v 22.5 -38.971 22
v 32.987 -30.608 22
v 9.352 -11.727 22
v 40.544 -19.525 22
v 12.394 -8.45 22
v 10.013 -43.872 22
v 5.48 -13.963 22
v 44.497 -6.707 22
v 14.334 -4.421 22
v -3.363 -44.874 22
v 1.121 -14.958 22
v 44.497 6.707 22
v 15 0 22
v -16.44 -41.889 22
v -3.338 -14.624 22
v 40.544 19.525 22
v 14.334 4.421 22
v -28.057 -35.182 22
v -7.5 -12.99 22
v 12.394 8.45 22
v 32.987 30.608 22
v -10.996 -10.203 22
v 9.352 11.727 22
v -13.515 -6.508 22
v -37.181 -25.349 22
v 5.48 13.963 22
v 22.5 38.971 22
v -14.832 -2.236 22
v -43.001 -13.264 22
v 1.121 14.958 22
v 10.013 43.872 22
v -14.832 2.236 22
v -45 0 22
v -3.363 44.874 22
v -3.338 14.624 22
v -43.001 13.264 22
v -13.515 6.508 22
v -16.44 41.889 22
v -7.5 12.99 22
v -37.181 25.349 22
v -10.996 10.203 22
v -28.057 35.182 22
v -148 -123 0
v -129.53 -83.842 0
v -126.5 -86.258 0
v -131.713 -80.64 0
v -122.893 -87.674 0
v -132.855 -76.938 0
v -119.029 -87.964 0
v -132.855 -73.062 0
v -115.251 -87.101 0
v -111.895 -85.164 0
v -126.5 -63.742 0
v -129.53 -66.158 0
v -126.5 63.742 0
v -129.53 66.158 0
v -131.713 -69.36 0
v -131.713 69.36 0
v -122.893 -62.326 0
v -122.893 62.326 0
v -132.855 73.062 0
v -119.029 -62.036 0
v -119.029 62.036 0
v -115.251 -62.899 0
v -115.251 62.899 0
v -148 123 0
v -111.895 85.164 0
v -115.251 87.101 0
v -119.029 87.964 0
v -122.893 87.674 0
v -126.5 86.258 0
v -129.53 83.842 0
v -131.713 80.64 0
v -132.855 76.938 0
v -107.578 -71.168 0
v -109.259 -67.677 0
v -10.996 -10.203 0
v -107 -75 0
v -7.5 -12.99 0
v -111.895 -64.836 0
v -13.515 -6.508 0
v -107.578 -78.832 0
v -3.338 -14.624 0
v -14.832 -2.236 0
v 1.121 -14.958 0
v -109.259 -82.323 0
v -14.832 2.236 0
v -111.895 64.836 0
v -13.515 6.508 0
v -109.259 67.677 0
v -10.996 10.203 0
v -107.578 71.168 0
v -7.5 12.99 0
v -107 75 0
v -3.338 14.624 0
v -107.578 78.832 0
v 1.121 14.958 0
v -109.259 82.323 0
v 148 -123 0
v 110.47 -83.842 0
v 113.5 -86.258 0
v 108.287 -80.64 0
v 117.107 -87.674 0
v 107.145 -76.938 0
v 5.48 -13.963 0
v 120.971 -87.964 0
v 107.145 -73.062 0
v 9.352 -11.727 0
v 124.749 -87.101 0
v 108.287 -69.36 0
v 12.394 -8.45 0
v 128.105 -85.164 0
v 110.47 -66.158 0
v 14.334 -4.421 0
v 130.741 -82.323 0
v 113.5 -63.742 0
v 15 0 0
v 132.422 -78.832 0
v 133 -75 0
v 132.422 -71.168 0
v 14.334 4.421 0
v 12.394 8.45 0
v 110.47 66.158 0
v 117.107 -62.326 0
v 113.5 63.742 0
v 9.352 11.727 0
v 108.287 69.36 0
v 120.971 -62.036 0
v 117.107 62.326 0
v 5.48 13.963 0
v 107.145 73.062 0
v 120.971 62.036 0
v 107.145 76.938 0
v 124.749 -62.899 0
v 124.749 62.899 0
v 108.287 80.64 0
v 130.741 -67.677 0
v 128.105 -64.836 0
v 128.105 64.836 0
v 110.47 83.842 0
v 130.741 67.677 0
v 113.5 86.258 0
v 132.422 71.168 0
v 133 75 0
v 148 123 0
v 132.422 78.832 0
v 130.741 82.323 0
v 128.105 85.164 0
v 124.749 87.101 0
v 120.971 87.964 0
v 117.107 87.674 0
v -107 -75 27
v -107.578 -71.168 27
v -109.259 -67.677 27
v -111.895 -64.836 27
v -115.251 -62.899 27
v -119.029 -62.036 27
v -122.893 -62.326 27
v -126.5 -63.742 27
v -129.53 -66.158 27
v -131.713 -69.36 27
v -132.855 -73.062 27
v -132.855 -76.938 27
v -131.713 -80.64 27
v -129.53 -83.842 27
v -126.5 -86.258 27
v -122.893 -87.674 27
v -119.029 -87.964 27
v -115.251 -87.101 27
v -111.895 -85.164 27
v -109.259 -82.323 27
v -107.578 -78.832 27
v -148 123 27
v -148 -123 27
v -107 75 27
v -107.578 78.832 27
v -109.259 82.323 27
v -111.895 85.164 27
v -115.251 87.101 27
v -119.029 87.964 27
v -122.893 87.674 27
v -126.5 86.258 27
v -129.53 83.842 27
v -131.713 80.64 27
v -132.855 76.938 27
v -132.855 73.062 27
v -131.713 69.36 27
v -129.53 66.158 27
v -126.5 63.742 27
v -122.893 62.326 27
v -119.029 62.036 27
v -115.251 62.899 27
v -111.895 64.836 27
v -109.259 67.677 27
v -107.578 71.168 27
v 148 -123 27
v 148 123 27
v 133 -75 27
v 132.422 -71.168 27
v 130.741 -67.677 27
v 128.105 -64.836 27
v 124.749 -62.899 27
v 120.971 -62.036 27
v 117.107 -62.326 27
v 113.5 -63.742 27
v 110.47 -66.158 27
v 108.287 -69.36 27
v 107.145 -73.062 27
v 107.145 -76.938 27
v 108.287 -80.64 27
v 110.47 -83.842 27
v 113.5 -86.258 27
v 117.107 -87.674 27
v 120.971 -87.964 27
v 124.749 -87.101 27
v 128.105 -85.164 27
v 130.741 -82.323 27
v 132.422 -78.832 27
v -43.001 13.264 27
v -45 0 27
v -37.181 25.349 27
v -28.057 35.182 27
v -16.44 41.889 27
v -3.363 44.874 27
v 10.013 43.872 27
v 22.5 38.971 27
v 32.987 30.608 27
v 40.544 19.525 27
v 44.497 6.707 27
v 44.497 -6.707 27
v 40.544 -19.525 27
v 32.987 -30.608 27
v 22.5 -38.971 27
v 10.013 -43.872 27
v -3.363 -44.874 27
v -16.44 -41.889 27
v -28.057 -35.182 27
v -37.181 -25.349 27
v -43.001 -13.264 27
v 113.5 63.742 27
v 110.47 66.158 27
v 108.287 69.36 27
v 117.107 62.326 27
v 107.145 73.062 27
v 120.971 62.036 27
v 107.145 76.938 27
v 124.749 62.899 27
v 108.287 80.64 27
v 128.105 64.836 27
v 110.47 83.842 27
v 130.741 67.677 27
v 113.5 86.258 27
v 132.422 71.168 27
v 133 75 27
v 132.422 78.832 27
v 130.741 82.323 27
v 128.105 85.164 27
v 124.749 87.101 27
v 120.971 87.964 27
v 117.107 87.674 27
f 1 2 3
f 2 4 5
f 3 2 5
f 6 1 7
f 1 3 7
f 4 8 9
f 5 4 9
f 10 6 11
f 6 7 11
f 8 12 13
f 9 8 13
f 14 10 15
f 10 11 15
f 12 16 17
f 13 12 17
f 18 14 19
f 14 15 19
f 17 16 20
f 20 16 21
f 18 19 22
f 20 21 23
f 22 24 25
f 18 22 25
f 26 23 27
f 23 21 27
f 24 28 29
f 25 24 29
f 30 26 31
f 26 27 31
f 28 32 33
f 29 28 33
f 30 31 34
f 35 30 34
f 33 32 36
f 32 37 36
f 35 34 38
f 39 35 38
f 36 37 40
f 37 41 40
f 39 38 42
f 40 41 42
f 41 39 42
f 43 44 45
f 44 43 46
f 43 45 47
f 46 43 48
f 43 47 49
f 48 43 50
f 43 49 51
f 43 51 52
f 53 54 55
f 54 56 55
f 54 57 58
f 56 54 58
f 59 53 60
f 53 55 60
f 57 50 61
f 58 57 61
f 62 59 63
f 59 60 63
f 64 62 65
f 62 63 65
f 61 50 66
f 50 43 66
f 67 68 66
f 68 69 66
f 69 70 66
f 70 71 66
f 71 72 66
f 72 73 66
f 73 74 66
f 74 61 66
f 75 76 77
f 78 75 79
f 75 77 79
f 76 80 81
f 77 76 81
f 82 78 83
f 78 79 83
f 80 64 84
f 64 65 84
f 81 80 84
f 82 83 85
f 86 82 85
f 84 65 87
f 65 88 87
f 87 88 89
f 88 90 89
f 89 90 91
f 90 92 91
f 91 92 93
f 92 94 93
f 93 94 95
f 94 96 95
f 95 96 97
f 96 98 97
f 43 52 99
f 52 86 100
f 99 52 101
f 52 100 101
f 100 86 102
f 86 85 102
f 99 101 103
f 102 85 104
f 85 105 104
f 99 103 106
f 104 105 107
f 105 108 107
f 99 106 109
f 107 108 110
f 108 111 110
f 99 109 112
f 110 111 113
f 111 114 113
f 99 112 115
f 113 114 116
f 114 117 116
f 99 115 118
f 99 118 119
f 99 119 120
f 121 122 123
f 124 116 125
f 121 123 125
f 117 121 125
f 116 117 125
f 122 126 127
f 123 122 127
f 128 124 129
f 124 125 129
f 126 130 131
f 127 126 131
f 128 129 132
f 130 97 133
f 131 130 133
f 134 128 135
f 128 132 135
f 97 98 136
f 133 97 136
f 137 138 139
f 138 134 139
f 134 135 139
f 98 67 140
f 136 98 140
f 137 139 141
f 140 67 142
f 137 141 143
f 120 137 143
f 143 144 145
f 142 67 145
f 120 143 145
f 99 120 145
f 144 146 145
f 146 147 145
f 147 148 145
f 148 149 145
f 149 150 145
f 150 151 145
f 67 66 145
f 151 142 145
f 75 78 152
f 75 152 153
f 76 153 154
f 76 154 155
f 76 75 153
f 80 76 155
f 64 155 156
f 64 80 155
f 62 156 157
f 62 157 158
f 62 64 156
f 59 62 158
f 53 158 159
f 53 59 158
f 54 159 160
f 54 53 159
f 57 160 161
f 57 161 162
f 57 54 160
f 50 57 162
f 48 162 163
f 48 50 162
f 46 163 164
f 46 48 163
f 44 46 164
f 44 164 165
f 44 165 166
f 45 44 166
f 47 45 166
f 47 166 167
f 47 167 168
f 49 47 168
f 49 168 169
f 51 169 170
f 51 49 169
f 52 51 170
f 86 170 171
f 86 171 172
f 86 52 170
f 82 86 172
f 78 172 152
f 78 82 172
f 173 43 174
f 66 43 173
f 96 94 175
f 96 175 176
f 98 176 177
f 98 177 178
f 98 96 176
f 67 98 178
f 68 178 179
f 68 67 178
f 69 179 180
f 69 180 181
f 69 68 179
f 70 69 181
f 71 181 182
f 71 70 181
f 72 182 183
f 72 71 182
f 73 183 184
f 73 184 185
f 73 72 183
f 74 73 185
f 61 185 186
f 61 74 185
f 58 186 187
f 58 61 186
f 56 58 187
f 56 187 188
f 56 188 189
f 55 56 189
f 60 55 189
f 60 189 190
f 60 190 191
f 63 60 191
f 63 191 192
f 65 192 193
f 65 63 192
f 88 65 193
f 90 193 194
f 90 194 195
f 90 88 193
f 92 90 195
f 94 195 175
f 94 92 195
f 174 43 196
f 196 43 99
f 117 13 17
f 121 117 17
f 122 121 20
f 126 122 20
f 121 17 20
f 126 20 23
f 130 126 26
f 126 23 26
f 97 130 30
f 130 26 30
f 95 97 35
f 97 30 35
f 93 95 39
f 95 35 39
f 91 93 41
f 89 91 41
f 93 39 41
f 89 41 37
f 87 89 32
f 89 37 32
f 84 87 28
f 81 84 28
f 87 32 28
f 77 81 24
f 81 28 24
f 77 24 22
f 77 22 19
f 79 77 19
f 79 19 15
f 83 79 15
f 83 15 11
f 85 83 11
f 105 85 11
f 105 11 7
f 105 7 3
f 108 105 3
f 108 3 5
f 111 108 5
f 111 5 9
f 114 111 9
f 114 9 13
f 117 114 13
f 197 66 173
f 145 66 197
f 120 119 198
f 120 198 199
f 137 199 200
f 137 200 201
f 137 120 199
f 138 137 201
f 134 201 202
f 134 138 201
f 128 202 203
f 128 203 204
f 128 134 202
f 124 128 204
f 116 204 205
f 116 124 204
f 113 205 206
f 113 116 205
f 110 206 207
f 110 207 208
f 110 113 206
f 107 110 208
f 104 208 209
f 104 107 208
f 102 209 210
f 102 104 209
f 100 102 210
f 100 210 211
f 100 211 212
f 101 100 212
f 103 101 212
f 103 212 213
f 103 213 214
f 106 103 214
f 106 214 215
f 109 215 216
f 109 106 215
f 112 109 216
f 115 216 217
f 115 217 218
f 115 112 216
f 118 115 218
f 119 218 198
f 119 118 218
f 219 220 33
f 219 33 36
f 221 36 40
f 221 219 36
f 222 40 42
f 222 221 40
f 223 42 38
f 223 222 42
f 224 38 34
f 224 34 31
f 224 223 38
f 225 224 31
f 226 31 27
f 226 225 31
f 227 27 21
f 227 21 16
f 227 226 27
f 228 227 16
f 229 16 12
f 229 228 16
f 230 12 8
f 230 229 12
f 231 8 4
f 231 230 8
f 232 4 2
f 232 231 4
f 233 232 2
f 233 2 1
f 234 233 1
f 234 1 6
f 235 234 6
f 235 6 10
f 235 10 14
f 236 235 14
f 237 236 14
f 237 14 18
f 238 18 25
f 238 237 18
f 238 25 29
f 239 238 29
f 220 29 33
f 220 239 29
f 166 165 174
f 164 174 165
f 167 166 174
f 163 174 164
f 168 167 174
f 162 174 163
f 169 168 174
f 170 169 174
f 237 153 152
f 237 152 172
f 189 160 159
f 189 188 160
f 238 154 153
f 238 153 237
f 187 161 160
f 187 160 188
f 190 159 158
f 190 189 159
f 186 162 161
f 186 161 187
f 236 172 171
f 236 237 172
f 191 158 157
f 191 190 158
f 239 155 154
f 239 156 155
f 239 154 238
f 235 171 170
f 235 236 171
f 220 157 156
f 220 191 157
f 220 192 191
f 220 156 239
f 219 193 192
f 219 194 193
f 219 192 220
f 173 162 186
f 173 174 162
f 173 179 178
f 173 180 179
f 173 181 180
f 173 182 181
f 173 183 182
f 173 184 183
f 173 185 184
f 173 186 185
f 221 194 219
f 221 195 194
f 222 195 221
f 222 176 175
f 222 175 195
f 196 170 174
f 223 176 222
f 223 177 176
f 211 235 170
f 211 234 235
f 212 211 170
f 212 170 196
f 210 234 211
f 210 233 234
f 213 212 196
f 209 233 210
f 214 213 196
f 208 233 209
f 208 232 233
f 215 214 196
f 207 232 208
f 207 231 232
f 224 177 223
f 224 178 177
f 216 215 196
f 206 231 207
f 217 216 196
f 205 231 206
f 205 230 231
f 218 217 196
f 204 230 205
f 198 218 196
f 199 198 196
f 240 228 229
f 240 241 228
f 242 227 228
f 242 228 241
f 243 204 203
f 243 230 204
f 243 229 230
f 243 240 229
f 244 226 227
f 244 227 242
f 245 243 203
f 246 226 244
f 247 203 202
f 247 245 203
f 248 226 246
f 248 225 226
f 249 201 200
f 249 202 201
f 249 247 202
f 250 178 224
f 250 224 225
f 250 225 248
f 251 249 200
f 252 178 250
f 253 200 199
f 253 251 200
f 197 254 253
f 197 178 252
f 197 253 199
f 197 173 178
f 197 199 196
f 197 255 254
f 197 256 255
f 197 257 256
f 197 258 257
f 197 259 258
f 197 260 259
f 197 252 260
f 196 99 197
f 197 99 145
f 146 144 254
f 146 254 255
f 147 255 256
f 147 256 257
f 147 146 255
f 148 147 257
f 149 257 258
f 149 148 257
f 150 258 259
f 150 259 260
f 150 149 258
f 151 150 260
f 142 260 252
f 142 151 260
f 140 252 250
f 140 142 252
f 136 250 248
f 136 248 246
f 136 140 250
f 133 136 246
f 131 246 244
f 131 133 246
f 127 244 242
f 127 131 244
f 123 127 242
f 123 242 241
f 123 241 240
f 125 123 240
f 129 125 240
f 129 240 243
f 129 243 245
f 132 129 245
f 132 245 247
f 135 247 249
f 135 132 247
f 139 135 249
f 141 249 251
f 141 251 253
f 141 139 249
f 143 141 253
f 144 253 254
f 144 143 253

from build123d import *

# Parameters (mm, degrees)
SKETCH1_W      = 296
SKETCH1_H      = 246
SKETCH1_R      = 13
EXTRUDE1_DEPTH = 27
SKETCH2_R      = 45
EXTRUDE2_DEPTH = 5
SKETCH3_R      = 15
EXTRUDE3_DEPTH = 23


with BuildPart() as part:
    # Sketch1 → Extrude1 (new body)
    with BuildSketch(Plane.XY):
        Rectangle(SKETCH1_W, SKETCH1_H)
        with Locations((-120, 75)):
            Circle(SKETCH1_R, mode=Mode.SUBTRACT)
        with Locations((120, 75)):
            Circle(SKETCH1_R, mode=Mode.SUBTRACT)
        with Locations((120, -75)):
            Circle(SKETCH1_R, mode=Mode.SUBTRACT)
        with Locations((-120, -75)):
            Circle(SKETCH1_R, mode=Mode.SUBTRACT)
    extrude(amount=EXTRUDE1_DEPTH)

    # Sketch2 → Extrude2 (cut)
    with BuildSketch(Plane(origin=(0, 0, 27), x_dir=(-1, 0, 0), z_dir=(0, 0, -1))):
        Circle(SKETCH2_R)
    extrude(amount=EXTRUDE2_DEPTH, mode=Mode.SUBTRACT)

    # Sketch3 → Extrude3 (cut, through all)
    with BuildSketch(Plane.XY.offset(22)):
        Circle(SKETCH3_R)
    extrude(amount=-EXTRUDE3_DEPTH, mode=Mode.SUBTRACT)


solid = part.part
